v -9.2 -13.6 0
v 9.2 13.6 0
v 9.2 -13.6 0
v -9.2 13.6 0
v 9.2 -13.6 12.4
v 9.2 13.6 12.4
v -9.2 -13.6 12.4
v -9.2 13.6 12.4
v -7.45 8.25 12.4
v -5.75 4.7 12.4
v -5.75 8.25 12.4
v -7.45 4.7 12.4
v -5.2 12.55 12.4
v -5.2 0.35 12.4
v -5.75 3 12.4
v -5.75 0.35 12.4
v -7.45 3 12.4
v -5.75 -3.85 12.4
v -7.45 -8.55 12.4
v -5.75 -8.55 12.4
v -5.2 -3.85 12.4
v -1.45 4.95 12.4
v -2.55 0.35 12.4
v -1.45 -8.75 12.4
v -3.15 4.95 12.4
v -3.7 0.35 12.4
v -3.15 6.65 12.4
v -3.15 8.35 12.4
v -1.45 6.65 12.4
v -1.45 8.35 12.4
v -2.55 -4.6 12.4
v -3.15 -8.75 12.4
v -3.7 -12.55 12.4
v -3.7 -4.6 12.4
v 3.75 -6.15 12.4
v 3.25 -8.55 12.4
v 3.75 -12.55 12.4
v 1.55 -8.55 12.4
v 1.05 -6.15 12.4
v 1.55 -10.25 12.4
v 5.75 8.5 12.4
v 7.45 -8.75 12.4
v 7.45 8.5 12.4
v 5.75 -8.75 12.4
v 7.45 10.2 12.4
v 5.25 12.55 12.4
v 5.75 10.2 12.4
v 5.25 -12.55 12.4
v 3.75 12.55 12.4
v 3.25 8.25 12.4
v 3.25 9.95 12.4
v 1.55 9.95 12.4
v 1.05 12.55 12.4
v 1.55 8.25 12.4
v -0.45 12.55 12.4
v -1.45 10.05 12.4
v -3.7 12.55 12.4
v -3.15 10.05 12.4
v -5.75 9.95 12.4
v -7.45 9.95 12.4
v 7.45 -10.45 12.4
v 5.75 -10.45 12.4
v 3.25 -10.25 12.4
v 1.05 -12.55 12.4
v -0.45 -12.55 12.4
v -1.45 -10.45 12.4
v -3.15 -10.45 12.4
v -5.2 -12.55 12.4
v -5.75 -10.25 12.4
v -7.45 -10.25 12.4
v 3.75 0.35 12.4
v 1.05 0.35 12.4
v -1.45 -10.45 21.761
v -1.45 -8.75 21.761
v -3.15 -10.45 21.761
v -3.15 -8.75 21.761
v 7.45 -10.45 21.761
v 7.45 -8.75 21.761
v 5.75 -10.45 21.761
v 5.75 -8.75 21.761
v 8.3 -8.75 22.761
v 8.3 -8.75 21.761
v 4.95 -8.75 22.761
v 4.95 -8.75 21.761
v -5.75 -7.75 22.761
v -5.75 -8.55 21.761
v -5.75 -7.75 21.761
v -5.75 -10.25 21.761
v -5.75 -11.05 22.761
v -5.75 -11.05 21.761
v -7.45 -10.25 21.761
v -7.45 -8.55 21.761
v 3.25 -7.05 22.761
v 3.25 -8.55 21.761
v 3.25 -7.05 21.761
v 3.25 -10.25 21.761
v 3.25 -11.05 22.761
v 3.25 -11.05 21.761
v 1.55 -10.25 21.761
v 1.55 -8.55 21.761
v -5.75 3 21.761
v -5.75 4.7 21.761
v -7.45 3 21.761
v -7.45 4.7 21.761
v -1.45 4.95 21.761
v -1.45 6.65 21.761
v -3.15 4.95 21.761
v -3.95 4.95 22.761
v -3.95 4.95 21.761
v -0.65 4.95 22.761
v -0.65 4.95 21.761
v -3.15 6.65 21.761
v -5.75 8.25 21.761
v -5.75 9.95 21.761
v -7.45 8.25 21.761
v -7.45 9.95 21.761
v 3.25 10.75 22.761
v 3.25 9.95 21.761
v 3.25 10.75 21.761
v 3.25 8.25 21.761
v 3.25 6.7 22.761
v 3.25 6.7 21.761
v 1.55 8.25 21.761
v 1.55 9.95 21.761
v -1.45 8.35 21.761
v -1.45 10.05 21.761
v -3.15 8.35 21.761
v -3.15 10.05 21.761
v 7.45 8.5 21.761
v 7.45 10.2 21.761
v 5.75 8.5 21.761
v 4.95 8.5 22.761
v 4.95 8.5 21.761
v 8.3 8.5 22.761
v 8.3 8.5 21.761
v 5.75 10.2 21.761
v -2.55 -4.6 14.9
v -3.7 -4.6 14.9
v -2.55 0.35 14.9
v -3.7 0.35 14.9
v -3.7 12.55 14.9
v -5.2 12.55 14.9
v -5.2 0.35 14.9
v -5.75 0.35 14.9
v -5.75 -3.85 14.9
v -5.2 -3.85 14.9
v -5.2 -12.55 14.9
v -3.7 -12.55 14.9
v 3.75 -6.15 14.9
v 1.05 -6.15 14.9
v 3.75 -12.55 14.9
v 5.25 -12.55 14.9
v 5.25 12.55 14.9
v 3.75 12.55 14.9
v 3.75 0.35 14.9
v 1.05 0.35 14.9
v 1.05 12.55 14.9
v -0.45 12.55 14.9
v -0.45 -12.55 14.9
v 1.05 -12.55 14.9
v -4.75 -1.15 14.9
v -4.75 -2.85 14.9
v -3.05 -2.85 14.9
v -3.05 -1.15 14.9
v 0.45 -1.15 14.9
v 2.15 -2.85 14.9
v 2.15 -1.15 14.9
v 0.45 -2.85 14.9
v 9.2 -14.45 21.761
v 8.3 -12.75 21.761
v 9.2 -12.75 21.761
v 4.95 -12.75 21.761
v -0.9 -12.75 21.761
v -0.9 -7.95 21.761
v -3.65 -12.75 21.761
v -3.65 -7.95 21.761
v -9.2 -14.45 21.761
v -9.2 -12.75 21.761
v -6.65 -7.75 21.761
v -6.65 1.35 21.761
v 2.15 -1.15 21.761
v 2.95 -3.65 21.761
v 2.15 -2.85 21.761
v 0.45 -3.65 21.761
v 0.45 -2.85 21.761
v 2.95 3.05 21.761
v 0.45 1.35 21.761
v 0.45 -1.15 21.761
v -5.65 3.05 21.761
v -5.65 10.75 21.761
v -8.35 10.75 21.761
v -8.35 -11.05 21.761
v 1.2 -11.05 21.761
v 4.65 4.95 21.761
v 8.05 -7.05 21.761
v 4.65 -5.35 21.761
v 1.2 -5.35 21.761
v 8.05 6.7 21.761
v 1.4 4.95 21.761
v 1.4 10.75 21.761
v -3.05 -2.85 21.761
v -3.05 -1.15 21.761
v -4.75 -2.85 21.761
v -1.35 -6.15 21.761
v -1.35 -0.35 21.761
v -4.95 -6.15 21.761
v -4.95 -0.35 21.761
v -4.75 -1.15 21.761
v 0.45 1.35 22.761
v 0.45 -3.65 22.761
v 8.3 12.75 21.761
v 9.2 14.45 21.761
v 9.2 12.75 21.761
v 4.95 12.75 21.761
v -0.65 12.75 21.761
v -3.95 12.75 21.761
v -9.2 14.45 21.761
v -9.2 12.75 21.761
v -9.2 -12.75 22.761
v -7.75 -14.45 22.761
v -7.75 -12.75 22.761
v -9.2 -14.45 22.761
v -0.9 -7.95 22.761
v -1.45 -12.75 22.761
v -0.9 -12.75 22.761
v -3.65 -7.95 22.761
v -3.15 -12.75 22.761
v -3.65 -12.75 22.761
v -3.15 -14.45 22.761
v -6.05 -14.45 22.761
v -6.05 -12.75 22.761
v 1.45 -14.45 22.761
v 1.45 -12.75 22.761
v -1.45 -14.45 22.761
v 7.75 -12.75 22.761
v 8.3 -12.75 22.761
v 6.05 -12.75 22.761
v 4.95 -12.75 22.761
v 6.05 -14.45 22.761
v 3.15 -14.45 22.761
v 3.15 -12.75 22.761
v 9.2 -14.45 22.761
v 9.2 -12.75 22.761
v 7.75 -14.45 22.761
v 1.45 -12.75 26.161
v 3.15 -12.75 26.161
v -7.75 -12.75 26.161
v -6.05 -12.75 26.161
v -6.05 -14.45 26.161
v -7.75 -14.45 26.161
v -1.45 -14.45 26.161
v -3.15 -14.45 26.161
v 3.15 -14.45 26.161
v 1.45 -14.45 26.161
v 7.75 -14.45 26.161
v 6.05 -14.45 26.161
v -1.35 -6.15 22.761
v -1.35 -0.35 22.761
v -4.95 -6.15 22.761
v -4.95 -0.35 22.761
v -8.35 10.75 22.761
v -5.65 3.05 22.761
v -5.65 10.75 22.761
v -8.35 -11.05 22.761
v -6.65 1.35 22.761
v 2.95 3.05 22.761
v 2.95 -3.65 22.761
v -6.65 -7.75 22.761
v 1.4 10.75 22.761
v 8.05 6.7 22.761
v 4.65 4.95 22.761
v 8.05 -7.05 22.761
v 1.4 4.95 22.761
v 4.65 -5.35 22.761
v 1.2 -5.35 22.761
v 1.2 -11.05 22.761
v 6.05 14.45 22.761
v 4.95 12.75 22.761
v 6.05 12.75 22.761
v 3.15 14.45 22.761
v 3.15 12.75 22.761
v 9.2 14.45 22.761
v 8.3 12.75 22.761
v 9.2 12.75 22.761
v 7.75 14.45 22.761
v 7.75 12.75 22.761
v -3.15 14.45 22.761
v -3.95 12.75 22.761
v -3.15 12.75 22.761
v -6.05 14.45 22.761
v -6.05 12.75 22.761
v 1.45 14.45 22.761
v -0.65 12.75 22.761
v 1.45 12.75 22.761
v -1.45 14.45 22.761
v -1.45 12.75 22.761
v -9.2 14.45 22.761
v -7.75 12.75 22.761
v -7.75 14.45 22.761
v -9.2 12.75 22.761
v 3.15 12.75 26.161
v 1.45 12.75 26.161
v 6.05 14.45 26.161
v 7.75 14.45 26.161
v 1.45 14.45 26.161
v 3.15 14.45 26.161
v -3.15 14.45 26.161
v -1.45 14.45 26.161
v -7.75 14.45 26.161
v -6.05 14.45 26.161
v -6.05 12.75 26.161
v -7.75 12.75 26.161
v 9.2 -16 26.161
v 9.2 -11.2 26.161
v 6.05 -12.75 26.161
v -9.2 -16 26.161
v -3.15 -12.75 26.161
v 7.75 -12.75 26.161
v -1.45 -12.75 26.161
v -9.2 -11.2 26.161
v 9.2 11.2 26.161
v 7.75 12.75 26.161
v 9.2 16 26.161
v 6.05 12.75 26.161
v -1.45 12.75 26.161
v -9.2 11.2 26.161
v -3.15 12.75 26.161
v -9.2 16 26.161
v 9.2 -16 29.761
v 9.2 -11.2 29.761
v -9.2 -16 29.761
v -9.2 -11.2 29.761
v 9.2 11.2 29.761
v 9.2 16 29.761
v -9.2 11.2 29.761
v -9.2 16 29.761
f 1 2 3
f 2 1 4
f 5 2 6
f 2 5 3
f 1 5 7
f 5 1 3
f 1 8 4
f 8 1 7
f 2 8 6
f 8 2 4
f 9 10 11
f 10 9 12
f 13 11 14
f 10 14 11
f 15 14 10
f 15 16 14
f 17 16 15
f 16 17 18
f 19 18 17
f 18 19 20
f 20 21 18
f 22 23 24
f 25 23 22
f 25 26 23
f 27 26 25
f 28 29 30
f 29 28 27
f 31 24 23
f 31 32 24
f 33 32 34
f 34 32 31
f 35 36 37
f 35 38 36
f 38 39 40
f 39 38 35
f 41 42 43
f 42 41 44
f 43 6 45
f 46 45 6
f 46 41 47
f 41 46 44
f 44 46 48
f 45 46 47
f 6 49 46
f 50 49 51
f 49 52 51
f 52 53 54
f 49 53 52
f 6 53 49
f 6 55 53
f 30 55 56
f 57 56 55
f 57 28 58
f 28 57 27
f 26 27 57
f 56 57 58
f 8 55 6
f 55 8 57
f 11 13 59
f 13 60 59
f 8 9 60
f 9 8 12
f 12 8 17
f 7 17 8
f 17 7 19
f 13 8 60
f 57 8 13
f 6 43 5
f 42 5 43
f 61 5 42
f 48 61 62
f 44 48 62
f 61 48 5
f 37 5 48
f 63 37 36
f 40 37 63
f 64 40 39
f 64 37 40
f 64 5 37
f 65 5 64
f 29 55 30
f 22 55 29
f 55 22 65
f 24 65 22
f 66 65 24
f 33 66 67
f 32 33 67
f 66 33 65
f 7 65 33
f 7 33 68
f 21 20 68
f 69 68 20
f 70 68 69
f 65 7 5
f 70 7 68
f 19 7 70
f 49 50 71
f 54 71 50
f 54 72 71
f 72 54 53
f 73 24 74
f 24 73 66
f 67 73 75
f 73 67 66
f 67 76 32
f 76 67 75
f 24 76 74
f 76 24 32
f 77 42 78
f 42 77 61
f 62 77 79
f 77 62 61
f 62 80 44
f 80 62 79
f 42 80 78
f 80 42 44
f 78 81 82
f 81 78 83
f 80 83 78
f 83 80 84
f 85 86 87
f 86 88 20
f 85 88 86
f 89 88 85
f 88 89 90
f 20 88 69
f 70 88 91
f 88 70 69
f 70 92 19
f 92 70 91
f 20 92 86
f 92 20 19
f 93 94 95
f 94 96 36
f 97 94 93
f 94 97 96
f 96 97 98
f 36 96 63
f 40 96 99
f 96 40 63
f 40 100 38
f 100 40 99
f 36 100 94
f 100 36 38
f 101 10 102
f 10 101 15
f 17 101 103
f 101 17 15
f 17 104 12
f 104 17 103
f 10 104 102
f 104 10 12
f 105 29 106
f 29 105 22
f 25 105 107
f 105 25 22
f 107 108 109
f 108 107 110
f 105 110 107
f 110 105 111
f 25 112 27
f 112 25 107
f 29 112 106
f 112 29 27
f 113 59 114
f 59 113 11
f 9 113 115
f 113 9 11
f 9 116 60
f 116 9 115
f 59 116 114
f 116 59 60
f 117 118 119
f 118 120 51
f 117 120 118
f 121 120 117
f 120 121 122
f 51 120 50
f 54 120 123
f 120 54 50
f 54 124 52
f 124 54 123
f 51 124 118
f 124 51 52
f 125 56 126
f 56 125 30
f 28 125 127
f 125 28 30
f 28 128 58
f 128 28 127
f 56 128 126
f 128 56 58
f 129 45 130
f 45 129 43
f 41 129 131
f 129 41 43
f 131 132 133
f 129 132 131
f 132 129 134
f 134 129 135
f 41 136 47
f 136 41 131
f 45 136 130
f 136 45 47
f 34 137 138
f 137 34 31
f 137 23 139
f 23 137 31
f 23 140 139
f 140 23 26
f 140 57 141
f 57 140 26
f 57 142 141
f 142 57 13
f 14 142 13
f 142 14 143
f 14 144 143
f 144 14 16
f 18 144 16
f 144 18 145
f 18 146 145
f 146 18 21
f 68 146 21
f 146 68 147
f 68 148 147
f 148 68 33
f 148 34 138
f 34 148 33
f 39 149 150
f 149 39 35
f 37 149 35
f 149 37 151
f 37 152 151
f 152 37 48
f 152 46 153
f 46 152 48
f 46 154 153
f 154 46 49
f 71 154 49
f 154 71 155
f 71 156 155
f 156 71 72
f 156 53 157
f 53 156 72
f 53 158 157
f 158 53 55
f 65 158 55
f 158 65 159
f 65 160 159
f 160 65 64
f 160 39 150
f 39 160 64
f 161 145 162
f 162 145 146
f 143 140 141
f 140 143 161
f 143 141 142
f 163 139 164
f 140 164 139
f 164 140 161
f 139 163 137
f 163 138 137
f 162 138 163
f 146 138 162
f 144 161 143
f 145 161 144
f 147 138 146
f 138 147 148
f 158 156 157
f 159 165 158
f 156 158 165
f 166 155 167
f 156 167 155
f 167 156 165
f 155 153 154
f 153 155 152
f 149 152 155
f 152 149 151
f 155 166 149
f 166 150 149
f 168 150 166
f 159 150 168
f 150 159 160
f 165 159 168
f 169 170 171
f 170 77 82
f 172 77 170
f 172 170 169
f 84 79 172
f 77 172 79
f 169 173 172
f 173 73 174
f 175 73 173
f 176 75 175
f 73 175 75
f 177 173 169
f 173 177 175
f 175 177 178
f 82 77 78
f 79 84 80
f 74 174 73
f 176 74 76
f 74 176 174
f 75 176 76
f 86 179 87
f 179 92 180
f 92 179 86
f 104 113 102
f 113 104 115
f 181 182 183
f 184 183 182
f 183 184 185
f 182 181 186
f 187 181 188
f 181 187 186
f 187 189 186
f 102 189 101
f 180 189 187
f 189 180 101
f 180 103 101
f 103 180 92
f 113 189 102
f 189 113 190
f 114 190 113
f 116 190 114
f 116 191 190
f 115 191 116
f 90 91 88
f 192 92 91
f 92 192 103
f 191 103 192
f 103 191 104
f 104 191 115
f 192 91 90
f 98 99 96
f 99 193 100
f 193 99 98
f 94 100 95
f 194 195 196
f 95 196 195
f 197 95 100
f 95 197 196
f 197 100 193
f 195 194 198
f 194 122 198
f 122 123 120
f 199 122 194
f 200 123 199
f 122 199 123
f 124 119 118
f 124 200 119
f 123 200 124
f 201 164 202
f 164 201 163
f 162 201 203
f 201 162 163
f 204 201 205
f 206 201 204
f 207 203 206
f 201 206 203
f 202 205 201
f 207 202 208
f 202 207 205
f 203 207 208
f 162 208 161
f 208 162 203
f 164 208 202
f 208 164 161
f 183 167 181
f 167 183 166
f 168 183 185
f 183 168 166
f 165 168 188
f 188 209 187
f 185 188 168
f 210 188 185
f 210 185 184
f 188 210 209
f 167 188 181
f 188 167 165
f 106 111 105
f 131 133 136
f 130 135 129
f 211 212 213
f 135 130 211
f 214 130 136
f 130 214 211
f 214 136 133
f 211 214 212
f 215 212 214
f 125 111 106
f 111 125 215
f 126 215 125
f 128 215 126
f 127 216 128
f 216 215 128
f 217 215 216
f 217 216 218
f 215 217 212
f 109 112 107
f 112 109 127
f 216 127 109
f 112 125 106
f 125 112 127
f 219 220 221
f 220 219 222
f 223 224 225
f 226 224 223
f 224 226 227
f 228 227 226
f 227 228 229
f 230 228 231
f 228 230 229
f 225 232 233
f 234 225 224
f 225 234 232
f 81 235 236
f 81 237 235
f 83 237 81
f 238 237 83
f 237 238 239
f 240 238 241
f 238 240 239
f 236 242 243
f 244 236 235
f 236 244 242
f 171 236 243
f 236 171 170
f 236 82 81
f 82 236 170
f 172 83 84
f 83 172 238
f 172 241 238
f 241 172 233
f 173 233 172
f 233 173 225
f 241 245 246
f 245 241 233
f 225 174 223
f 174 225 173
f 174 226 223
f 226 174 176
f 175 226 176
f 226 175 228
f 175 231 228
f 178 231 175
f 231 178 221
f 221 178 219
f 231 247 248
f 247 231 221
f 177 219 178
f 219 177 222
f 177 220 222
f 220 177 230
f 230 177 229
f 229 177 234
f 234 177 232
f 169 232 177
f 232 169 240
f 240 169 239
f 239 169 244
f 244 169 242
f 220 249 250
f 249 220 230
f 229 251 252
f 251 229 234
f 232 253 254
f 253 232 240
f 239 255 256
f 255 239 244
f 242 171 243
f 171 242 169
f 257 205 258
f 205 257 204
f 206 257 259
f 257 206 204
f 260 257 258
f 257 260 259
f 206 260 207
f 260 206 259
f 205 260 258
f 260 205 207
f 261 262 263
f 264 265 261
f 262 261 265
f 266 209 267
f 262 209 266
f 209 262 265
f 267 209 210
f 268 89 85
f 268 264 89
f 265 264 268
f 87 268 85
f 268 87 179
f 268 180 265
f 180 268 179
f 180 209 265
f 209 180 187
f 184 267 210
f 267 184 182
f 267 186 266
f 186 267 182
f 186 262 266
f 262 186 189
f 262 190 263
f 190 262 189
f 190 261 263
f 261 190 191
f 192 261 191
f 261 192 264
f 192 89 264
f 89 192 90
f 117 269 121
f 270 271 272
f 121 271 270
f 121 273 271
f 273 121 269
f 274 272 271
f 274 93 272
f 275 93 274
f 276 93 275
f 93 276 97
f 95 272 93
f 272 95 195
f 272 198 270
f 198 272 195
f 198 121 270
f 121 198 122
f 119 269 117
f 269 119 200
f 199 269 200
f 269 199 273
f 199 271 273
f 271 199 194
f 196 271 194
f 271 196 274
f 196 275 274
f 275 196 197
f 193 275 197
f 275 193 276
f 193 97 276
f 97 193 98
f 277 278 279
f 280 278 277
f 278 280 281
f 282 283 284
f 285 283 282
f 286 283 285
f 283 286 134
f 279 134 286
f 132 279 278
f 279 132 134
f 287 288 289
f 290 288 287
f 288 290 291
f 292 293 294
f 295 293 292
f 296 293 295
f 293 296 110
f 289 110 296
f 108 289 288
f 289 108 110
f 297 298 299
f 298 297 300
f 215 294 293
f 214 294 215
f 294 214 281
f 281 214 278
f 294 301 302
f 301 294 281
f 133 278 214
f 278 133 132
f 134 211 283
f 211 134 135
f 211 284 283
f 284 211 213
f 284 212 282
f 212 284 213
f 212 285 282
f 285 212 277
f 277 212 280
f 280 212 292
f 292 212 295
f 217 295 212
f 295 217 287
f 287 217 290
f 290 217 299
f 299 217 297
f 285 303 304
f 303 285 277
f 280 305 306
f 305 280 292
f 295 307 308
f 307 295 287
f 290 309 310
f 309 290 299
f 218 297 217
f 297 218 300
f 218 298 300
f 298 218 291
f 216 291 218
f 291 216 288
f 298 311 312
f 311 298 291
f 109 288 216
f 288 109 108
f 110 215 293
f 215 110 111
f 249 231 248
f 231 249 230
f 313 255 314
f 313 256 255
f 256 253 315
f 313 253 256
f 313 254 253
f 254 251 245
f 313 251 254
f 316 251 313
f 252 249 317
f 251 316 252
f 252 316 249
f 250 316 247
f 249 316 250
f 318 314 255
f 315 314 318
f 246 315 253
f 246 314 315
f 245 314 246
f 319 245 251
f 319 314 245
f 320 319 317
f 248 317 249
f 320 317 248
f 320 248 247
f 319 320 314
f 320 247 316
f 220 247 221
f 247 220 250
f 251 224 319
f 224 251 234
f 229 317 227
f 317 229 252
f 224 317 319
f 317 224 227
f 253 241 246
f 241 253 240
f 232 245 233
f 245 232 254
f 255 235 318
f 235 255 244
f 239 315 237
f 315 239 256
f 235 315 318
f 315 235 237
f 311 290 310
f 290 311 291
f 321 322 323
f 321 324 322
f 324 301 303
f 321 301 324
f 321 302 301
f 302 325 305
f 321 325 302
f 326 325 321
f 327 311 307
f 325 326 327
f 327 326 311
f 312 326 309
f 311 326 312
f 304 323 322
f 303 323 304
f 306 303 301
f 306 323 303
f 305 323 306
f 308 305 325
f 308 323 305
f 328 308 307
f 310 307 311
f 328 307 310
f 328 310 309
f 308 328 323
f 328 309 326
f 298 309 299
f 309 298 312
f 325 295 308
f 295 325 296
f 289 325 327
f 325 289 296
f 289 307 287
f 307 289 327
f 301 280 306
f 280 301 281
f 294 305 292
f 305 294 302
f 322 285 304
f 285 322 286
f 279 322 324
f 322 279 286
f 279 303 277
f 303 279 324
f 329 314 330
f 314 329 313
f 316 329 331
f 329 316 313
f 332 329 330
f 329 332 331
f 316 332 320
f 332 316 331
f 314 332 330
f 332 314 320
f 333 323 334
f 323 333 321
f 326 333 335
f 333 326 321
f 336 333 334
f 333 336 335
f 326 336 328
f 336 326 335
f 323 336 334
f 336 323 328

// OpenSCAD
// Generated by SolidPython 0.4.2 on 2020-09-29 23:20:17
//!OpenSCAD

scale(v = 0.0100000000) {
	translate(v = [-920, -1360, 0]) {
		union() {
			color(c = [0.4000000000, 0.4000000000, 0.4000000000]) {
				translate(v = [0, 0, 0]) {
					linear_extrude(height = 1000.0000000000) {
						polygon(paths = [[0, 1, 2, 3]], points = [[0, 0], [0, 2720], [1840, 2720], [1840, 0]]);
					}
				}
			}
			color(c = [0.2000000000, 0.6000000000, 0.2000000000]) {
				translate(v = [0, 0, 1000.0000000000]) {
					linear_extrude(height = 120.0000000000) {
						polygon(paths = [[0, 1, 2, 3]], points = [[0, 1305], [0, 2720], [1840, 2720], [1840, 1305]]);
					}
				}
			}
			color(c = [0.4000000000, 0.4000000000, 0.4000000000]) {
				translate(v = [0, 0, 1000.0000000000]) {
					linear_extrude(height = 120.0000000000) {
						polygon(paths = [[0, 1, 2, 3]], points = [[0, 0], [0, 1305], [1840, 1305], [1840, 0]]);
					}
				}
			}
			color(c = [0.9000000000, 0.6000000000, 0.6000000000]) {
				translate(v = [0, 0, 1120.0000000000]) {
					linear_extrude(height = 120.0000000000) {
						polygon(paths = [[0, 1, 2, 3]], points = [[135, 1485], [135, 2485], [400, 2485], [400, 1485]]);
					}
				}
			}
			color(c = [0.9000000000, 0.6000000000, 0.6000000000]) {
				translate(v = [0, 0, 1120.0000000000]) {
					linear_extrude(height = 120.0000000000) {
						polygon(paths = [[0, 1, 2, 3]], points = [[550, 1485], [550, 2485], [875, 2485], [875, 1485]]);
					}
				}
			}
			color(c = [0.9000000000, 0.6000000000, 0.6000000000]) {
				translate(v = [0, 0, 1120.0000000000]) {
					linear_extrude(height = 120.0000000000) {
						polygon(paths = [[0, 1, 2, 3]], points = [[1025, 1485], [1025, 2485], [1295, 2485], [1295, 1485]]);
					}
				}
			}
			color(c = [0.9000000000, 0.6000000000, 0.6000000000]) {
				translate(v = [0, 0, 1120.0000000000]) {
					linear_extrude(height = 120.0000000000) {
						polygon(paths = [[0, 1, 2, 3]], points = [[1445, 1485], [1445, 2485], [1705, 2485], [1705, 1485]]);
					}
				}
			}
			color(c = [0.9000000000, 0.6000000000, 0.9000000000]) {
				translate(v = [0, 0, 1120.0000000000]) {
					linear_extrude(height = 120.0000000000) {
						polygon(paths = [[0, 1, 2, 3]], points = [[135, 235], [135, 655], [400, 655], [400, 235]]);
					}
				}
			}
			color(c = [0.9000000000, 0.6000000000, 0.9000000000]) {
				translate(v = [0, 0, 1120.0000000000]) {
					linear_extrude(height = 120.0000000000) {
						polygon(paths = [[0, 1, 2, 3]], points = [[550, 235], [550, 655], [875, 655], [875, 235]]);
					}
				}
			}
			color(c = [0.9000000000, 0.6000000000, 0.9000000000]) {
				translate(v = [0, 0, 1120.0000000000]) {
					linear_extrude(height = 120.0000000000) {
						polygon(paths = [[0, 1, 2, 3]], points = [[1025, 235], [1025, 655], [1295, 655], [1295, 235]]);
					}
				}
			}
			color(c = [0.9000000000, 0.6000000000, 0.9000000000]) {
				translate(v = [0, 0, 1120.0000000000]) {
					linear_extrude(height = 120.0000000000) {
						polygon(paths = [[0, 1, 2, 3]], points = [[1445, 235], [1445, 655], [1705, 655], [1705, 235]]);
					}
				}
			}
			color(c = [0.2000000000, 0.6000000000, 0.2000000000]) {
				translate(v = [0, 0, 1120.0000000000]) {
					linear_extrude(height = 120.0000000000) {
						difference() {
							polygon(paths = [[0, 1, 2, 3]], points = [[0, 1305], [0, 2720], [1840, 2720], [1840, 1305]]);
							polygon(paths = [[0, 1, 2, 3]], points = [[135, 1485], [400, 1485], [400, 2485], [135, 2485]]);
							polygon(paths = [[0, 1, 2, 3]], points = [[550, 1485], [875, 1485], [875, 2485], [550, 2485]]);
							polygon(paths = [[0, 1, 2, 3]], points = [[1025, 1485], [1295, 1485], [1295, 2485], [1025, 2485]]);
							polygon(paths = [[0, 1, 2, 3]], points = [[1445, 1485], [1705, 1485], [1705, 2485], [1445, 2485]]);
						}
					}
				}
			}
			color(c = [0.4000000000, 0.4000000000, 0.4000000000]) {
				translate(v = [0, 0, 1120.0000000000]) {
					linear_extrude(height = 120.0000000000) {
						difference() {
							polygon(paths = [[0, 1, 2, 3]], points = [[0, 0], [0, 1305], [1840, 1305], [1840, 0]]);
							polygon(paths = [[0, 1, 2, 3]], points = [[135, 235], [400, 235], [400, 655], [135, 655]]);
							polygon(paths = [[0, 1, 2, 3]], points = [[550, 235], [875, 235], [875, 655], [550, 655]]);
							polygon(paths = [[0, 1, 2, 3]], points = [[1025, 235], [1295, 235], [1295, 655], [1025, 655]]);
							polygon(paths = [[0, 1, 2, 3]], points = [[1445, 235], [1705, 235], [1705, 655], [1445, 655]]);
						}
					}
				}
			}
			color(c = [0.1000000000, 0.1000000000, 0.1000000000]) {
				translate(v = [0, 0, 1240.0000000000]) {
					linear_extrude(height = 70.0000000000) {
						polygon(paths = [[0, 1, 2, 3]], points = [[605, 315], [605, 485], [775, 485], [775, 315]]);
					}
				}
			}
			color(c = [0.1000000000, 0.1000000000, 0.1000000000]) {
				translate(v = [0, 0, 1240.0000000000]) {
					linear_extrude(height = 70.0000000000) {
						polygon(paths = [[0, 1, 2, 3]], points = [[1495, 315], [1495, 485], [1665, 485], [1665, 315]]);
					}
				}
			}
			color(c = [0.1000000000, 0.1000000000, 0.1000000000]) {
				translate(v = [0, 0, 1240.0000000000]) {
					linear_extrude(height = 70.0000000000) {
						polygon(paths = [[0, 1, 2, 3]], points = [[175, 335], [175, 505], [345, 505], [345, 335]]);
					}
				}
			}
			color(c = [0.1000000000, 0.1000000000, 0.1000000000]) {
				translate(v = [0, 0, 1240.0000000000]) {
					linear_extrude(height = 70.0000000000) {
						polygon(paths = [[0, 1, 2, 3]], points = [[1075, 335], [1075, 505], [1245, 505], [1245, 335]]);
					}
				}
			}
			color(c = [0.1000000000, 0.1000000000, 0.1000000000]) {
				translate(v = [0, 0, 1240.0000000000]) {
					linear_extrude(height = 70.0000000000) {
						polygon(paths = [[0, 1, 2, 3]], points = [[175, 1660], [175, 1830], [345, 1830], [345, 1660]]);
					}
				}
			}
			color(c = [0.1000000000, 0.1000000000, 0.1000000000]) {
				translate(v = [0, 0, 1240.0000000000]) {
					linear_extrude(height = 70.0000000000) {
						polygon(paths = [[0, 1, 2, 3]], points = [[605, 1855], [605, 2025], [775, 2025], [775, 1855]]);
					}
				}
			}
			color(c = [0.1000000000, 0.1000000000, 0.1000000000]) {
				translate(v = [0, 0, 1240.0000000000]) {
					linear_extrude(height = 70.0000000000) {
						polygon(paths = [[0, 1, 2, 3]], points = [[175, 2185], [175, 2355], [345, 2355], [345, 2185]]);
					}
				}
			}
			color(c = [0.1000000000, 0.1000000000, 0.1000000000]) {
				translate(v = [0, 0, 1240.0000000000]) {
					linear_extrude(height = 70.0000000000) {
						polygon(paths = [[0, 1, 2, 3]], points = [[1075, 2185], [1075, 2355], [1245, 2355], [1245, 2185]]);
					}
				}
			}
			color(c = [0.1000000000, 0.1000000000, 0.1000000000]) {
				translate(v = [0, 0, 1240.0000000000]) {
					linear_extrude(height = 70.0000000000) {
						polygon(paths = [[0, 1, 2, 3]], points = [[605, 2195], [605, 2365], [775, 2365], [775, 2195]]);
					}
				}
			}
			color(c = [0.1000000000, 0.1000000000, 0.1000000000]) {
				translate(v = [0, 0, 1240.0000000000]) {
					linear_extrude(height = 70.0000000000) {
						polygon(paths = [[0, 1, 2, 3]], points = [[1495, 2210], [1495, 2380], [1665, 2380], [1665, 2210]]);
					}
				}
			}
			color(c = [1.0000000000, 1.0000000000, 1.0000000000]) {
				translate(v = [0, 0, 1240.0000000000]) {
					linear_extrude(height = 70.0000000000) {
						polygon(paths = [[0, 1, 2, 3, 4, 5, 6, 7, 8, 9, 10, 11]], points = [[400, 105], [400, 975], [345, 975], [345, 1395], [400, 1395], [400, 2615], [550, 2615], [550, 1395], [665, 1395], [665, 900], [550, 900], [550, 105]]);
					}
				}
			}
			color(c = [1.0000000000, 1.0000000000, 1.0000000000]) {
				translate(v = [0, 0, 1240.0000000000]) {
					linear_extrude(height = 70.0000000000) {
						polygon(paths = [[0, 1, 2, 3, 4, 5, 6, 7, 8, 9, 10, 11]], points = [[875, 105], [875, 2615], [1025, 2615], [1025, 1395], [1295, 1395], [1295, 2615], [1445, 2615], [1445, 105], [1295, 105], [1295, 745], [1025, 745], [1025, 105]]);
					}
				}
			}
			color(c = [0.1000000000, 0.1000000000, 0.1000000000]) {
				translate(v = [0, 0, 1310.0000000000]) {
					linear_extrude(height = 180.0000000000) {
						polygon(paths = [[0, 1, 2, 3]], points = [[605, 315], [605, 485], [775, 485], [775, 315]]);
					}
				}
			}
			color(c = [0.1000000000, 0.1000000000, 0.1000000000]) {
				translate(v = [0, 0, 1310.0000000000]) {
					linear_extrude(height = 180.0000000000) {
						polygon(paths = [[0, 1, 2, 3]], points = [[1495, 315], [1495, 485], [1665, 485], [1665, 315]]);
					}
				}
			}
			color(c = [0.1000000000, 0.1000000000, 0.1000000000]) {
				translate(v = [0, 0, 1310.0000000000]) {
					linear_extrude(height = 180.0000000000) {
						polygon(paths = [[0, 1, 2, 3]], points = [[175, 335], [175, 505], [345, 505], [345, 335]]);
					}
				}
			}
			color(c = [0.1000000000, 0.1000000000, 0.1000000000]) {
				translate(v = [0, 0, 1310.0000000000]) {
					linear_extrude(height = 180.0000000000) {
						polygon(paths = [[0, 1, 2, 3]], points = [[1075, 335], [1075, 505], [1245, 505], [1245, 335]]);
					}
				}
			}
			color(c = [0.1000000000, 0.1000000000, 0.1000000000]) {
				translate(v = [0, 0, 1310.0000000000]) {
					linear_extrude(height = 180.0000000000) {
						polygon(paths = [[0, 1, 2, 3]], points = [[175, 1660], [175, 1830], [345, 1830], [345, 1660]]);
					}
				}
			}
			color(c = [0.1000000000, 0.1000000000, 0.1000000000]) {
				translate(v = [0, 0, 1310.0000000000]) {
					linear_extrude(height = 180.0000000000) {
						polygon(paths = [[0, 1, 2, 3]], points = [[605, 1855], [605, 2025], [775, 2025], [775, 1855]]);
					}
				}
			}
			color(c = [0.1000000000, 0.1000000000, 0.1000000000]) {
				translate(v = [0, 0, 1310.0000000000]) {
					linear_extrude(height = 180.0000000000) {
						polygon(paths = [[0, 1, 2, 3]], points = [[175, 2185], [175, 2355], [345, 2355], [345, 2185]]);
					}
				}
			}
			color(c = [0.1000000000, 0.1000000000, 0.1000000000]) {
				translate(v = [0, 0, 1310.0000000000]) {
					linear_extrude(height = 180.0000000000) {
						polygon(paths = [[0, 1, 2, 3]], points = [[1075, 2185], [1075, 2355], [1245, 2355], [1245, 2185]]);
					}
				}
			}
			color(c = [0.1000000000, 0.1000000000, 0.1000000000]) {
				translate(v = [0, 0, 1310.0000000000]) {
					linear_extrude(height = 180.0000000000) {
						polygon(paths = [[0, 1, 2, 3]], points = [[605, 2195], [605, 2365], [775, 2365], [775, 2195]]);
					}
				}
			}
			color(c = [0.1000000000, 0.1000000000, 0.1000000000]) {
				translate(v = [0, 0, 1310.0000000000]) {
					linear_extrude(height = 180.0000000000) {
						polygon(paths = [[0, 1, 2, 3]], points = [[1495, 2210], [1495, 2380], [1665, 2380], [1665, 2210]]);
					}
				}
			}
			color(c = [0.7000000000, 0, 0]) {
				translate(v = [0, 0, 1310.0000000000]) {
					linear_extrude(height = 180.0000000000) {
						polygon(paths = [[0, 1, 2, 3, 4, 5, 6, 7, 8, 9, 10, 11]], points = [[400, 105], [400, 975], [345, 975], [345, 1395], [400, 1395], [400, 2615], [550, 2615], [550, 1395], [665, 1395], [665, 900], [550, 900], [550, 105]]);
					}
				}
			}
			color(c = [0.7000000000, 0, 0]) {
				translate(v = [0, 0, 1310.0000000000]) {
					linear_extrude(height = 180.0000000000) {
						polygon(paths = [[0, 1, 2, 3, 4, 5, 6, 7, 8, 9, 10, 11]], points = [[875, 105], [875, 2615], [1025, 2615], [1025, 1395], [1295, 1395], [1295, 2615], [1445, 2615], [1445, 105], [1295, 105], [1295, 745], [1025, 745], [1025, 105]]);
					}
				}
			}
			color(c = [0.1000000000, 0.1000000000, 0.1000000000]) {
				translate(v = [0, 0, 1490.0000000000]) {
					linear_extrude(height = 686.1000000000) {
						polygon(paths = [[0, 1, 2, 3]], points = [[605, 315], [605, 485], [775, 485], [775, 315]]);
					}
				}
			}
			color(c = [0.1000000000, 0.1000000000, 0.1000000000]) {
				translate(v = [0, 0, 1490.0000000000]) {
					linear_extrude(height = 686.1000000000) {
						polygon(paths = [[0, 1, 2, 3]], points = [[1495, 315], [1495, 485], [1665, 485], [1665, 315]]);
					}
				}
			}
			color(c = [0.1000000000, 0.1000000000, 0.1000000000]) {
				translate(v = [0, 0, 1490.0000000000]) {
					linear_extrude(height = 686.1000000000) {
						polygon(paths = [[0, 1, 2, 3]], points = [[175, 335], [175, 505], [345, 505], [345, 335]]);
					}
				}
			}
			color(c = [0.1000000000, 0.1000000000, 0.1000000000]) {
				translate(v = [0, 0, 1490.0000000000]) {
					linear_extrude(height = 686.1000000000) {
						polygon(paths = [[0, 1, 2, 3]], points = [[1075, 335], [1075, 505], [1245, 505], [1245, 335]]);
					}
				}
			}
			color(c = [0.1000000000, 0.1000000000, 0.1000000000]) {
				translate(v = [0, 0, 1490.0000000000]) {
					linear_extrude(height = 686.1000000000) {
						polygon(paths = [[0, 1, 2, 3]], points = [[445, 1075], [445, 1245], [615, 1245], [615, 1075]]);
					}
				}
			}
			color(c = [0.1000000000, 0.1000000000, 0.1000000000]) {
				translate(v = [0, 0, 1490.0000000000]) {
					linear_extrude(height = 686.1000000000) {
						polygon(paths = [[0, 1, 2, 3]], points = [[965, 1075], [965, 1245], [1135, 1245], [1135, 1075]]);
					}
				}
			}
			color(c = [0.1000000000, 0.1000000000, 0.1000000000]) {
				translate(v = [0, 0, 1490.0000000000]) {
					linear_extrude(height = 686.1000000000) {
						polygon(paths = [[0, 1, 2, 3]], points = [[175, 1660], [175, 1830], [345, 1830], [345, 1660]]);
					}
				}
			}
			color(c = [0.1000000000, 0.1000000000, 0.1000000000]) {
				translate(v = [0, 0, 1490.0000000000]) {
					linear_extrude(height = 686.1000000000) {
						polygon(paths = [[0, 1, 2, 3]], points = [[605, 1855], [605, 2025], [775, 2025], [775, 1855]]);
					}
				}
			}
			color(c = [0.1000000000, 0.1000000000, 0.1000000000]) {
				translate(v = [0, 0, 1490.0000000000]) {
					linear_extrude(height = 686.1000000000) {
						polygon(paths = [[0, 1, 2, 3]], points = [[175, 2185], [175, 2355], [345, 2355], [345, 2185]]);
					}
				}
			}
			color(c = [0.1000000000, 0.1000000000, 0.1000000000]) {
				translate(v = [0, 0, 1490.0000000000]) {
					linear_extrude(height = 686.1000000000) {
						polygon(paths = [[0, 1, 2, 3]], points = [[1075, 2185], [1075, 2355], [1245, 2355], [1245, 2185]]);
					}
				}
			}
			color(c = [0.1000000000, 0.1000000000, 0.1000000000]) {
				translate(v = [0, 0, 1490.0000000000]) {
					linear_extrude(height = 686.1000000000) {
						polygon(paths = [[0, 1, 2, 3]], points = [[605, 2195], [605, 2365], [775, 2365], [775, 2195]]);
					}
				}
			}
			color(c = [0.1000000000, 0.1000000000, 0.1000000000]) {
				translate(v = [0, 0, 1490.0000000000]) {
					linear_extrude(height = 686.1000000000) {
						polygon(paths = [[0, 1, 2, 3]], points = [[1495, 2210], [1495, 2380], [1665, 2380], [1665, 2210]]);
					}
				}
			}
			color(c = [0.9000000000, 0.6000000000, 0.6000000000]) {
				translate(v = [0, 0, 2176.1000000000]) {
					linear_extrude(height = 100.0000000000) {
						polygon(paths = [[0, 1, 2, 3, 4, 5, 6, 7, 8, 9, 10, 11]], points = [[0, -85], [0, 85], [555, 85], [555, 565], [830, 565], [830, 85], [1415, 85], [1415, 485], [1750, 485], [1750, 85], [1840, 85], [1840, -85]]);
					}
				}
			}
			color(c = [0.9000000000, 0.6000000000, 0.6000000000]) {
				translate(v = [0, 0, 2176.1000000000]) {
					linear_extrude(height = 100.0000000000) {
						polygon(paths = [[0, 1, 2, 3]], points = [[425, 745], [425, 1325], [785, 1325], [785, 745]]);
					}
				}
			}
			color(c = [0.9000000000, 0.6000000000, 0.6000000000]) {
				translate(v = [0, 0, 2176.1000000000]) {
					linear_extrude(height = 100.0000000000) {
						polygon(paths = [[0, 1, 2, 3, 4, 5, 6, 7, 8, 9, 10, 11]], points = [[85, 255], [85, 2435], [355, 2435], [355, 1665], [1215, 1665], [1215, 995], [965, 995], [965, 1495], [255, 1495], [255, 585], [345, 585], [345, 255]]);
					}
				}
			}
			color(c = [0.9000000000, 0.6000000000, 0.6000000000]) {
				translate(v = [0, 0, 2176.1000000000]) {
					linear_extrude(height = 100.0000000000) {
						polygon(paths = [[0, 1, 2, 3, 4, 5, 6, 7, 8, 9, 10, 11]], points = [[1040, 255], [1040, 825], [1385, 825], [1385, 1855], [1060, 1855], [1060, 2435], [1245, 2435], [1245, 2030], [1725, 2030], [1725, 655], [1245, 655], [1245, 255]]);
					}
				}
			}
			color(c = [0.9000000000, 0.6000000000, 0.6000000000]) {
				translate(v = [0, 0, 2176.1000000000]) {
					linear_extrude(height = 100.0000000000) {
						polygon(paths = [[0, 1, 2, 3, 4, 5, 6, 7, 8, 9, 10, 11]], points = [[525, 1855], [525, 2635], [0, 2635], [0, 2805], [1840, 2805], [1840, 2635], [1750, 2635], [1750, 2210], [1415, 2210], [1415, 2635], [855, 2635], [855, 1855]]);
					}
				}
			}
			color(c = [0.5000000000, 0.5000000000, 0.5000000000]) {
				translate(v = [0, 0, 2276.1000000000]) {
					linear_extrude(height = 340.0000000000) {
						polygon(paths = [[0, 1, 2, 3]], points = [[145, -85], [145, 85], [315, 85], [315, -85]]);
					}
				}
			}
			color(c = [0.5000000000, 0.5000000000, 0.5000000000]) {
				translate(v = [0, 0, 2276.1000000000]) {
					linear_extrude(height = 340.0000000000) {
						polygon(paths = [[0, 1, 2, 3]], points = [[605, -85], [605, 85], [775, 85], [775, -85]]);
					}
				}
			}
			color(c = [0.5000000000, 0.5000000000, 0.5000000000]) {
				translate(v = [0, 0, 2276.1000000000]) {
					linear_extrude(height = 340.0000000000) {
						polygon(paths = [[0, 1, 2, 3]], points = [[1065, -85], [1065, 85], [1235, 85], [1235, -85]]);
					}
				}
			}
			color(c = [0.5000000000, 0.5000000000, 0.5000000000]) {
				translate(v = [0, 0, 2276.1000000000]) {
					linear_extrude(height = 340.0000000000) {
						polygon(paths = [[0, 1, 2, 3]], points = [[1525, -85], [1525, 85], [1695, 85], [1695, -85]]);
					}
				}
			}
			color(c = [0.5000000000, 0.5000000000, 0.5000000000]) {
				translate(v = [0, 0, 2276.1000000000]) {
					linear_extrude(height = 340.0000000000) {
						polygon(paths = [[0, 1, 2, 3]], points = [[145, 2635], [145, 2805], [315, 2805], [315, 2635]]);
					}
				}
			}
			color(c = [0.5000000000, 0.5000000000, 0.5000000000]) {
				translate(v = [0, 0, 2276.1000000000]) {
					linear_extrude(height = 340.0000000000) {
						polygon(paths = [[0, 1, 2, 3]], points = [[605, 2635], [605, 2805], [775, 2805], [775, 2635]]);
					}
				}
			}
			color(c = [0.5000000000, 0.5000000000, 0.5000000000]) {
				translate(v = [0, 0, 2276.1000000000]) {
					linear_extrude(height = 340.0000000000) {
						polygon(paths = [[0, 1, 2, 3]], points = [[1065, 2635], [1065, 2805], [1235, 2805], [1235, 2635]]);
					}
				}
			}
			color(c = [0.5000000000, 0.5000000000, 0.5000000000]) {
				translate(v = [0, 0, 2276.1000000000]) {
					linear_extrude(height = 340.0000000000) {
						polygon(paths = [[0, 1, 2, 3]], points = [[1525, 2635], [1525, 2805], [1695, 2805], [1695, 2635]]);
					}
				}
			}
			color(c = [0.3000000000, 0.3000000000, 1]) {
				translate(v = [0, 0, 2616.1000000000]) {
					linear_extrude(height = 360.0000000000) {
						polygon(paths = [[0, 1, 2, 3]], points = [[0, -240], [0, 240], [1840, 240], [1840, -240]]);
					}
				}
			}
			color(c = [0.3000000000, 0.3000000000, 1]) {
				translate(v = [0, 0, 2616.1000000000]) {
					linear_extrude(height = 360.0000000000) {
						polygon(paths = [[0, 1, 2, 3]], points = [[0, 2480], [0, 2960], [1840, 2960], [1840, 2480]]);
					}
				}
			}
		}
	}
}
